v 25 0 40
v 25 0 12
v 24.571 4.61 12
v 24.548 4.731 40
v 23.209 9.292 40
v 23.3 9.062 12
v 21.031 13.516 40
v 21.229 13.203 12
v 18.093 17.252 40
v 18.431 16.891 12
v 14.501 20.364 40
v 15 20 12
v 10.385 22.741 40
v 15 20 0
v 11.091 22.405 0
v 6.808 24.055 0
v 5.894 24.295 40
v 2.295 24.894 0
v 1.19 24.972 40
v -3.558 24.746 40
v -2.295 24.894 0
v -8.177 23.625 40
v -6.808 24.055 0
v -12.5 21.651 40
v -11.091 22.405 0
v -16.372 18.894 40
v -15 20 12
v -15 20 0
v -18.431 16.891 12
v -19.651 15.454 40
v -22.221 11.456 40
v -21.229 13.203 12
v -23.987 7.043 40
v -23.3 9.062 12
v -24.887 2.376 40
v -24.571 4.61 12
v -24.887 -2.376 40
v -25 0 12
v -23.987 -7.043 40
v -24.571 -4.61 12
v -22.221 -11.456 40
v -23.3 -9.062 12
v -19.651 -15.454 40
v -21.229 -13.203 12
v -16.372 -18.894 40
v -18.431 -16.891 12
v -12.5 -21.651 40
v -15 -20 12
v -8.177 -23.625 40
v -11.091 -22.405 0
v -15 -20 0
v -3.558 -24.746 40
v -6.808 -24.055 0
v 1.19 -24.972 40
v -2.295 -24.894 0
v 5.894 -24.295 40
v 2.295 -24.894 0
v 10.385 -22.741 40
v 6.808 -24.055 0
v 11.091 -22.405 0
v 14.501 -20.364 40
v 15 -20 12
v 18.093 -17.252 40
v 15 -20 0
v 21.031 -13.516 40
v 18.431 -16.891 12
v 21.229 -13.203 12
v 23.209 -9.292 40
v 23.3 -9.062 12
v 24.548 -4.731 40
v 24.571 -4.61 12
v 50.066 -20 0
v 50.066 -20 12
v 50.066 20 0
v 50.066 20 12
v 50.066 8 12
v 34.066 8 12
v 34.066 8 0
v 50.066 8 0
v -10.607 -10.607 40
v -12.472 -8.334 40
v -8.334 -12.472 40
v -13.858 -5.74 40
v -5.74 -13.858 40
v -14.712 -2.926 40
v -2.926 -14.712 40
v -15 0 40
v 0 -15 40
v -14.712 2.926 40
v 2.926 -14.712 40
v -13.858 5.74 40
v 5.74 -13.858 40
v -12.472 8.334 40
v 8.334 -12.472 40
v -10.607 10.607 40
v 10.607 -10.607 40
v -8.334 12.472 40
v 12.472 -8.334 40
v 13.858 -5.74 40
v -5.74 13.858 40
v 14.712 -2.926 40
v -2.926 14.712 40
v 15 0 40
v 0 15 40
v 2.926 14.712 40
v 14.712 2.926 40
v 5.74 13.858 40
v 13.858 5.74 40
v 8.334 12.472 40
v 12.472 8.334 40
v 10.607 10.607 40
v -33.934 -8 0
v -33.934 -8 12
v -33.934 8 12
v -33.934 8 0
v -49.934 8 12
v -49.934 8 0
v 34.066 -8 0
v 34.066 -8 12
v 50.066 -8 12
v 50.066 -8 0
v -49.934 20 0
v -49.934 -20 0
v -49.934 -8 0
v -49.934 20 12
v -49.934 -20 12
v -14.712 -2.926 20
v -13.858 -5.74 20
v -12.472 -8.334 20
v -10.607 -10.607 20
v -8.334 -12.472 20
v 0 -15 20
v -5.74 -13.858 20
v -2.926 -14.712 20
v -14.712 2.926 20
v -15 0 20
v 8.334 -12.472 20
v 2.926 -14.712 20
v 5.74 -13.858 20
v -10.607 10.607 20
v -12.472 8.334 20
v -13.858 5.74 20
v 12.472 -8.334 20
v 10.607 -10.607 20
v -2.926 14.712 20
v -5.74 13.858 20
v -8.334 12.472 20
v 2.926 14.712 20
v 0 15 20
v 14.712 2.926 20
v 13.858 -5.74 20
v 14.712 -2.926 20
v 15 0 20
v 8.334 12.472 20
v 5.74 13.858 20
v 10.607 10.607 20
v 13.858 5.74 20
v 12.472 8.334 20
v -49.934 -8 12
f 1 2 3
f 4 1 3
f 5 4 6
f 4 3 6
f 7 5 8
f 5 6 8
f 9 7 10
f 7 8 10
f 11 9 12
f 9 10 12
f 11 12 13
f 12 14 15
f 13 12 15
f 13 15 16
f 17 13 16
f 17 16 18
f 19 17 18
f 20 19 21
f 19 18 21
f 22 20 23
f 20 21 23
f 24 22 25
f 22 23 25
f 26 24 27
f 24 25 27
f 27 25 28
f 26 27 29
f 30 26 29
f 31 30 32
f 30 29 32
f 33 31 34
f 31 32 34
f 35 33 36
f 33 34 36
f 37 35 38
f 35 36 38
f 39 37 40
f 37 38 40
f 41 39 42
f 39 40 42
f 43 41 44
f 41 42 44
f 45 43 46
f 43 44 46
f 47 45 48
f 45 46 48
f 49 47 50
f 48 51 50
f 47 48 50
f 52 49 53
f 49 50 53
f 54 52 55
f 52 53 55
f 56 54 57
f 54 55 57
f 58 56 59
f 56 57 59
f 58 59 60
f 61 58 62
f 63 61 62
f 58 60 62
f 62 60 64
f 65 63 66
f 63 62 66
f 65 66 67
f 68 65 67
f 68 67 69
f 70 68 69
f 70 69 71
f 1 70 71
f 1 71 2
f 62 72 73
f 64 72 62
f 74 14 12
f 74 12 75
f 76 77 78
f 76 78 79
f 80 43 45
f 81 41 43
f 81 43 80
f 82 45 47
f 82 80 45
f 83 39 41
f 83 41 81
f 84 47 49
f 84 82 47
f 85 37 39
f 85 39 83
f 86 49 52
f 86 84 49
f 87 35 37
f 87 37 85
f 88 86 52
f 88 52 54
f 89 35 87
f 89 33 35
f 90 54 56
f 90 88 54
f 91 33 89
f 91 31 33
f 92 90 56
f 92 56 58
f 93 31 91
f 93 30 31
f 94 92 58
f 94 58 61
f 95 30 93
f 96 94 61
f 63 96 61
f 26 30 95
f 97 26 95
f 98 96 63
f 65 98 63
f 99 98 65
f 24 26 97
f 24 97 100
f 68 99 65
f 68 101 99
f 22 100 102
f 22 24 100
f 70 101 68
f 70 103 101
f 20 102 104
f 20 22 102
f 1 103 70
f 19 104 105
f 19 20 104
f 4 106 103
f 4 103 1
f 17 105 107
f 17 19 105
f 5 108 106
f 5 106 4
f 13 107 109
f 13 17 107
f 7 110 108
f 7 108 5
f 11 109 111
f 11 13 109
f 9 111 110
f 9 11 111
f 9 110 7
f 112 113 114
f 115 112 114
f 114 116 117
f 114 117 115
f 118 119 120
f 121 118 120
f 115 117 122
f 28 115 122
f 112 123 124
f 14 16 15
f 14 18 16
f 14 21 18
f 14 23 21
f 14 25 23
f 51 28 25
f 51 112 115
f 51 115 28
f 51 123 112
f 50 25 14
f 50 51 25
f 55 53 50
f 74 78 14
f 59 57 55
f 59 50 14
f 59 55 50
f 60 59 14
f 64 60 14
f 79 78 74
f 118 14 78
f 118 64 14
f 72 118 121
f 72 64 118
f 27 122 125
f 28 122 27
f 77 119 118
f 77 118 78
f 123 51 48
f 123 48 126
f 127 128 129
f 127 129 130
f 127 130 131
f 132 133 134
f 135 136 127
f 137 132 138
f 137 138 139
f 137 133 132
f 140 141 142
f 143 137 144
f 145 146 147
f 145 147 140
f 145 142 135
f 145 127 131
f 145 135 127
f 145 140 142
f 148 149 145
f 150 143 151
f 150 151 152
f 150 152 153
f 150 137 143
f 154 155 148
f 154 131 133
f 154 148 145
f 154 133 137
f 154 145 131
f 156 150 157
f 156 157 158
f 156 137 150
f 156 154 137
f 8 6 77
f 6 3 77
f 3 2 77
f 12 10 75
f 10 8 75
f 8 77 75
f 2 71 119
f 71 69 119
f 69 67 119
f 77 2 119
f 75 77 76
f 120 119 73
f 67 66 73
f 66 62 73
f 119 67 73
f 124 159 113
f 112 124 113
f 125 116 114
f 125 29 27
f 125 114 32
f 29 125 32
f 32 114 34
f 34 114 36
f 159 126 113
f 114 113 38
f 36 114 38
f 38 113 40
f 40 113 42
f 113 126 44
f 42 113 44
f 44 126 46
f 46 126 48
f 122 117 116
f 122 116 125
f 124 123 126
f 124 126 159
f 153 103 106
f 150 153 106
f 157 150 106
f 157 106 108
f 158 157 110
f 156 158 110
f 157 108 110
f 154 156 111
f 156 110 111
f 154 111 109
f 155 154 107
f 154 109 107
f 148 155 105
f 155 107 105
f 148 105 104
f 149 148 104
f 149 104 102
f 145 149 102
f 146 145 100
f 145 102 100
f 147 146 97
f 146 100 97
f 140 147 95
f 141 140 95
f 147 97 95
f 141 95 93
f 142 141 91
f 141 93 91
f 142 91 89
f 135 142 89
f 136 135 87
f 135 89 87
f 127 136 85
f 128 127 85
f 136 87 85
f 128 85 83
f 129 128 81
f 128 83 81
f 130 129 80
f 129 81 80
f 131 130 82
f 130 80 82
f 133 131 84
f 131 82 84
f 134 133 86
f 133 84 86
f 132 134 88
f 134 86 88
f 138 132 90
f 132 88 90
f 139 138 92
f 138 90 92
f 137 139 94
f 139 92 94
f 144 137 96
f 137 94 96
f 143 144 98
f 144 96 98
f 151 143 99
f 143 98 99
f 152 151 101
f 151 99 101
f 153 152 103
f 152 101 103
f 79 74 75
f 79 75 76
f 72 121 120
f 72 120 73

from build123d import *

# Parameters (mm, degrees)
F0_R     = 25
F1_DEPTH = 40
F2_R     = 15
F3_DEPTH = 20
F5_DEPTH = 12
F6_W     = 16
F6_H     = 16
F7_DEPTH = 12
F8_W     = 16
F8_H     = 16
F9_DEPTH = 12


with BuildPart() as f1:
    # F0 (on Top) → F1 (new body)
    with BuildSketch(Plane.XY):
        Circle(F0_R)
    extrude(amount=F1_DEPTH)

    # F2 (on face) → F3 (cut)
    with BuildSketch(Plane.XY.offset(40)):
        Circle(F2_R)
    extrude(amount=-F3_DEPTH, mode=Mode.SUBTRACT)

    # F4 (on face) → F5 (join)
    with BuildSketch(Plane(origin=(0, 0, 0), x_dir=(1, 0, 0), z_dir=(0, 0, -1))):
        with BuildLine():
            Line((50.0656880438, 20), (15, 20))
            ThreePointArc((15, 20), (22.360679775, 11.1803398875), (25, 0))
            ThreePointArc((25, 0), (22.360679775, -11.1803398875), (15, -20))
            Line((15, -20), (50.0656880438, -20))
            Line((50.0656880438, -20), (50.0656880438, 20))
        make_face()
        with BuildLine():
            Line((-15, 20), (-49.9343119562, 20))
            Line((-49.9343119562, 20), (-49.9343119562, -20))
            Line((-49.9343119562, -20), (-15, -20))
            ThreePointArc((-15, -20), (-25, 0), (-15, 20))
        make_face()
        with BuildLine():
            Line((15, 20), (-15, 20))
            ThreePointArc((-15, 20), (-25, 0), (-15, -20))
            Line((-15, -20), (15, -20))
            ThreePointArc((15, -20), (22.360679775, -11.1803398875), (25, 0))
            ThreePointArc((25, 0), (22.360679775, 11.1803398875), (15, 20))
        make_face()
    extrude(amount=-F5_DEPTH)

    # F6 (on face) → F7 (cut)
    with BuildSketch(Plane.XY.offset(12)):
        with Locations((-41.9343119562, 0)):
            Rectangle(F6_W, F6_H)
    extrude(amount=-F7_DEPTH, mode=Mode.SUBTRACT)

    # F8 (on face) → F9 (cut)
    with BuildSketch(Plane.XY.offset(12)):
        with Locations((42.0656880438, 0)):
            Rectangle(F8_W, F8_H)
    extrude(amount=-F9_DEPTH, mode=Mode.SUBTRACT)


solid = f1.part
